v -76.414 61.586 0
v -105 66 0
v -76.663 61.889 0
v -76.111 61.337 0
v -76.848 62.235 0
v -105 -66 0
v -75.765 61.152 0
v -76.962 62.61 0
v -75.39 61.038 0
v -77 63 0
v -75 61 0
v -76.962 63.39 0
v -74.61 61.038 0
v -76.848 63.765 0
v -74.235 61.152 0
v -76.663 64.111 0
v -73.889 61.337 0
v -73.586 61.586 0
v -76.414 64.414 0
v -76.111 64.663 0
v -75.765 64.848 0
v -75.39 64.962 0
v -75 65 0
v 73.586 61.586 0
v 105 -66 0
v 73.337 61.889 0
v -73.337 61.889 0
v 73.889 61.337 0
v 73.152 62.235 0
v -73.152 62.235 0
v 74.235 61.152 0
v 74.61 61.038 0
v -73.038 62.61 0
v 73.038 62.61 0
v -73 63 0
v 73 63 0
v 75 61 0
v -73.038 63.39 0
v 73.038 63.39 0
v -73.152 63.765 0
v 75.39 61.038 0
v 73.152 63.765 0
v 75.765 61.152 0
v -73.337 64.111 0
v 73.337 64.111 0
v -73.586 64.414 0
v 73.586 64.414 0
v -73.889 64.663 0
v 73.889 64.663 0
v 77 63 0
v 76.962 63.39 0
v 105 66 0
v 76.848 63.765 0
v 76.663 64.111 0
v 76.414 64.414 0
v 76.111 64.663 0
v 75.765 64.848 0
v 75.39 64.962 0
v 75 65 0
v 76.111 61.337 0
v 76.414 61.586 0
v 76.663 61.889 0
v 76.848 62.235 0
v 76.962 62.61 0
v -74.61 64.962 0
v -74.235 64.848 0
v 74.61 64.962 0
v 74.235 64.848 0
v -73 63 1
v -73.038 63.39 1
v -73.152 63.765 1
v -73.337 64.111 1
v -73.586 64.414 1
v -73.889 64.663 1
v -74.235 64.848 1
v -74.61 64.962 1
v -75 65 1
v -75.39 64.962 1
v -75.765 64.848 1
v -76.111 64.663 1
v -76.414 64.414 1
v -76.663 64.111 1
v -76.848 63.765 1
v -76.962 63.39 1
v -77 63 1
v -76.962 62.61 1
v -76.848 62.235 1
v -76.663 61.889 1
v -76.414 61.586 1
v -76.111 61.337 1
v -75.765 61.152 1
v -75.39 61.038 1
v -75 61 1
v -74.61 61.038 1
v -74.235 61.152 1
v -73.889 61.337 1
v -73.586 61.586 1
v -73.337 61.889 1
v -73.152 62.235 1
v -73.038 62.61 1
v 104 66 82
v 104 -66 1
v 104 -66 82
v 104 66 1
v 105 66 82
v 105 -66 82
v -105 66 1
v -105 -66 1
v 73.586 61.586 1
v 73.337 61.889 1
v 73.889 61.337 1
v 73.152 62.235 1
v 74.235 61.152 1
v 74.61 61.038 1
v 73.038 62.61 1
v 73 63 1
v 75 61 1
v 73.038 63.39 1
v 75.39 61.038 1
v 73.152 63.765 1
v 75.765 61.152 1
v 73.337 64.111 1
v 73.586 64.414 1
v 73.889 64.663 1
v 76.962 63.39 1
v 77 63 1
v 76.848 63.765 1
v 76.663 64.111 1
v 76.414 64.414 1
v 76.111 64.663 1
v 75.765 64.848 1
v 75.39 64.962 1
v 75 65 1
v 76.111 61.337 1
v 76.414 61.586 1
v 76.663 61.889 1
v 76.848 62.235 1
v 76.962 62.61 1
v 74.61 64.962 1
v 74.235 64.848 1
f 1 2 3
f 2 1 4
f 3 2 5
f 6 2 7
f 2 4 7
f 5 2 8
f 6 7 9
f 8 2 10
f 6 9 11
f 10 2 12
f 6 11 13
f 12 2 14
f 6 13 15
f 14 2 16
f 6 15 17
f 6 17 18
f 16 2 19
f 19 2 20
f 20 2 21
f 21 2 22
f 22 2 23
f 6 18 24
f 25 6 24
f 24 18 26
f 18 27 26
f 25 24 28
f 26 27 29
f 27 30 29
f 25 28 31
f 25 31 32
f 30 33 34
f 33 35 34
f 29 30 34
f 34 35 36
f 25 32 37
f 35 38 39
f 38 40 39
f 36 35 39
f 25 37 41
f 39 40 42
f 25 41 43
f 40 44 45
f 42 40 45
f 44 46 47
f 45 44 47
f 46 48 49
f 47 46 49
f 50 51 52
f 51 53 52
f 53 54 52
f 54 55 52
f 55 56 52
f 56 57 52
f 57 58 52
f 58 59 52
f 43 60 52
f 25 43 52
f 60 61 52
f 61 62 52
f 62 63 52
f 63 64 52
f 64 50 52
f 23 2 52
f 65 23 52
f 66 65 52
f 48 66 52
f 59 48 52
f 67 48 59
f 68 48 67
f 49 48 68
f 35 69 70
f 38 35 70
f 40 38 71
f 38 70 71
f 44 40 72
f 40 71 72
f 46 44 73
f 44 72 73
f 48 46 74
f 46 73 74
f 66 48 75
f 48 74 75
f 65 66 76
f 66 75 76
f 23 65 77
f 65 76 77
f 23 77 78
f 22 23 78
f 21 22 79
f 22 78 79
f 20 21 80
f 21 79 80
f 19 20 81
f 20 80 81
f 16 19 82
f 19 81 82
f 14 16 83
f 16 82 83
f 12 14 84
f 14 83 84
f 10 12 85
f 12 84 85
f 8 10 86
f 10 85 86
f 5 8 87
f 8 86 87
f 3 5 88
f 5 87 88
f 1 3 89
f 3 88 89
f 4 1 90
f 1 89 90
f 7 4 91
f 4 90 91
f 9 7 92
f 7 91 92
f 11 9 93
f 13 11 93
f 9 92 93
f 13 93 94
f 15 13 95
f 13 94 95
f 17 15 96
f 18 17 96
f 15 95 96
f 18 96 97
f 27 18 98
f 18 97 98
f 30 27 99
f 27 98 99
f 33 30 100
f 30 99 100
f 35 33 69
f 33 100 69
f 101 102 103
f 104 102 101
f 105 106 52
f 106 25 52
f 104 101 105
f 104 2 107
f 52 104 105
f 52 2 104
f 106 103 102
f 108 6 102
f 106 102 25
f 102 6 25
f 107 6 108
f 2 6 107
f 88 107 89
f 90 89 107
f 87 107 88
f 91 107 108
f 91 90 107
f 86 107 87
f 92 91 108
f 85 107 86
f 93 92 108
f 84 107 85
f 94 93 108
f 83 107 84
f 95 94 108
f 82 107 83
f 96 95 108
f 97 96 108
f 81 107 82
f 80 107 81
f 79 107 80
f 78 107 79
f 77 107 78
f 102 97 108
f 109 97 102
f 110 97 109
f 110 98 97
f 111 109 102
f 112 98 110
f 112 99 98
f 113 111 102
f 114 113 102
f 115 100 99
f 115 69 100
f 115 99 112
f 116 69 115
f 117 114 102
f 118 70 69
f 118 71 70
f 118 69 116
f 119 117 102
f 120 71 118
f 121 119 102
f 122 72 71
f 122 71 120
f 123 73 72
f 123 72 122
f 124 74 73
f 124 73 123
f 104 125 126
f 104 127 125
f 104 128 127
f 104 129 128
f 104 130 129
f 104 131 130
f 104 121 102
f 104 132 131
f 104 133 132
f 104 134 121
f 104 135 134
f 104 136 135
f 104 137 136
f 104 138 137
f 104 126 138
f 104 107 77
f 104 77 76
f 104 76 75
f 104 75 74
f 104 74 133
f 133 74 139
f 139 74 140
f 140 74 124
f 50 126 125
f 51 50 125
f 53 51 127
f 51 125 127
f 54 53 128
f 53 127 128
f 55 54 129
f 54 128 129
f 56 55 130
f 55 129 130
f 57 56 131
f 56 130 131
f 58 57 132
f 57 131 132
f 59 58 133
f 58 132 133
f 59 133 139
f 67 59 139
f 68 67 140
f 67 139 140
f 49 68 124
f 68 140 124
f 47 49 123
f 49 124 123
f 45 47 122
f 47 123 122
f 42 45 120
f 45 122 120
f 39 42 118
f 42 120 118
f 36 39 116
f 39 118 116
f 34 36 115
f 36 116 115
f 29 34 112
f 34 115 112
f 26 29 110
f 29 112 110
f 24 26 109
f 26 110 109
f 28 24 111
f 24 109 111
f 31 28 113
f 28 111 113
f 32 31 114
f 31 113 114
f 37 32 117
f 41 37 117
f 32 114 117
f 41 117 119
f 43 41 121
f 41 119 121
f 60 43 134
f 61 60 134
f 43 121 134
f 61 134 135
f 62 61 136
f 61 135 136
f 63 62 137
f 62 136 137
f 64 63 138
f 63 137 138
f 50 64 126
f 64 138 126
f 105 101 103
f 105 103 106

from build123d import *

# Parameters (mm, degrees)
SKETCH_1_W          = 210
SKETCH_1_H          = 132
EXTRUDE_1_DEPTH     = 1
SKETCH_3_W          = 1
SKETCH_3_H          = 132
EXTRUDE_2_DEPTH     = 81
SKETCH_2_R          = 2
CUT_EXTRUDE_1_DEPTH = 1


with BuildPart() as part:
    # 草图1 → 凸台-拉伸1 (new body)
    with BuildSketch(Plane.XY):
        Rectangle(SKETCH_1_W, SKETCH_1_H)
    extrude(amount=EXTRUDE_1_DEPTH)

    # 草图3 → 凸台-拉伸2 (add)
    with BuildSketch(Plane.XY.offset(1)):
        with Locations((104.5, 0)):
            Rectangle(SKETCH_3_W, SKETCH_3_H)
    extrude(amount=EXTRUDE_2_DEPTH)

    # 草图2 → 切除-拉伸1 (cut)
    with BuildSketch(Plane.XY.offset(1)):
        with Locations((-75, 63)):
            Circle(SKETCH_2_R)
        with Locations((75, 63)):
            Circle(SKETCH_2_R)
    extrude(amount=-CUT_EXTRUDE_1_DEPTH, mode=Mode.SUBTRACT)


solid = part.part
